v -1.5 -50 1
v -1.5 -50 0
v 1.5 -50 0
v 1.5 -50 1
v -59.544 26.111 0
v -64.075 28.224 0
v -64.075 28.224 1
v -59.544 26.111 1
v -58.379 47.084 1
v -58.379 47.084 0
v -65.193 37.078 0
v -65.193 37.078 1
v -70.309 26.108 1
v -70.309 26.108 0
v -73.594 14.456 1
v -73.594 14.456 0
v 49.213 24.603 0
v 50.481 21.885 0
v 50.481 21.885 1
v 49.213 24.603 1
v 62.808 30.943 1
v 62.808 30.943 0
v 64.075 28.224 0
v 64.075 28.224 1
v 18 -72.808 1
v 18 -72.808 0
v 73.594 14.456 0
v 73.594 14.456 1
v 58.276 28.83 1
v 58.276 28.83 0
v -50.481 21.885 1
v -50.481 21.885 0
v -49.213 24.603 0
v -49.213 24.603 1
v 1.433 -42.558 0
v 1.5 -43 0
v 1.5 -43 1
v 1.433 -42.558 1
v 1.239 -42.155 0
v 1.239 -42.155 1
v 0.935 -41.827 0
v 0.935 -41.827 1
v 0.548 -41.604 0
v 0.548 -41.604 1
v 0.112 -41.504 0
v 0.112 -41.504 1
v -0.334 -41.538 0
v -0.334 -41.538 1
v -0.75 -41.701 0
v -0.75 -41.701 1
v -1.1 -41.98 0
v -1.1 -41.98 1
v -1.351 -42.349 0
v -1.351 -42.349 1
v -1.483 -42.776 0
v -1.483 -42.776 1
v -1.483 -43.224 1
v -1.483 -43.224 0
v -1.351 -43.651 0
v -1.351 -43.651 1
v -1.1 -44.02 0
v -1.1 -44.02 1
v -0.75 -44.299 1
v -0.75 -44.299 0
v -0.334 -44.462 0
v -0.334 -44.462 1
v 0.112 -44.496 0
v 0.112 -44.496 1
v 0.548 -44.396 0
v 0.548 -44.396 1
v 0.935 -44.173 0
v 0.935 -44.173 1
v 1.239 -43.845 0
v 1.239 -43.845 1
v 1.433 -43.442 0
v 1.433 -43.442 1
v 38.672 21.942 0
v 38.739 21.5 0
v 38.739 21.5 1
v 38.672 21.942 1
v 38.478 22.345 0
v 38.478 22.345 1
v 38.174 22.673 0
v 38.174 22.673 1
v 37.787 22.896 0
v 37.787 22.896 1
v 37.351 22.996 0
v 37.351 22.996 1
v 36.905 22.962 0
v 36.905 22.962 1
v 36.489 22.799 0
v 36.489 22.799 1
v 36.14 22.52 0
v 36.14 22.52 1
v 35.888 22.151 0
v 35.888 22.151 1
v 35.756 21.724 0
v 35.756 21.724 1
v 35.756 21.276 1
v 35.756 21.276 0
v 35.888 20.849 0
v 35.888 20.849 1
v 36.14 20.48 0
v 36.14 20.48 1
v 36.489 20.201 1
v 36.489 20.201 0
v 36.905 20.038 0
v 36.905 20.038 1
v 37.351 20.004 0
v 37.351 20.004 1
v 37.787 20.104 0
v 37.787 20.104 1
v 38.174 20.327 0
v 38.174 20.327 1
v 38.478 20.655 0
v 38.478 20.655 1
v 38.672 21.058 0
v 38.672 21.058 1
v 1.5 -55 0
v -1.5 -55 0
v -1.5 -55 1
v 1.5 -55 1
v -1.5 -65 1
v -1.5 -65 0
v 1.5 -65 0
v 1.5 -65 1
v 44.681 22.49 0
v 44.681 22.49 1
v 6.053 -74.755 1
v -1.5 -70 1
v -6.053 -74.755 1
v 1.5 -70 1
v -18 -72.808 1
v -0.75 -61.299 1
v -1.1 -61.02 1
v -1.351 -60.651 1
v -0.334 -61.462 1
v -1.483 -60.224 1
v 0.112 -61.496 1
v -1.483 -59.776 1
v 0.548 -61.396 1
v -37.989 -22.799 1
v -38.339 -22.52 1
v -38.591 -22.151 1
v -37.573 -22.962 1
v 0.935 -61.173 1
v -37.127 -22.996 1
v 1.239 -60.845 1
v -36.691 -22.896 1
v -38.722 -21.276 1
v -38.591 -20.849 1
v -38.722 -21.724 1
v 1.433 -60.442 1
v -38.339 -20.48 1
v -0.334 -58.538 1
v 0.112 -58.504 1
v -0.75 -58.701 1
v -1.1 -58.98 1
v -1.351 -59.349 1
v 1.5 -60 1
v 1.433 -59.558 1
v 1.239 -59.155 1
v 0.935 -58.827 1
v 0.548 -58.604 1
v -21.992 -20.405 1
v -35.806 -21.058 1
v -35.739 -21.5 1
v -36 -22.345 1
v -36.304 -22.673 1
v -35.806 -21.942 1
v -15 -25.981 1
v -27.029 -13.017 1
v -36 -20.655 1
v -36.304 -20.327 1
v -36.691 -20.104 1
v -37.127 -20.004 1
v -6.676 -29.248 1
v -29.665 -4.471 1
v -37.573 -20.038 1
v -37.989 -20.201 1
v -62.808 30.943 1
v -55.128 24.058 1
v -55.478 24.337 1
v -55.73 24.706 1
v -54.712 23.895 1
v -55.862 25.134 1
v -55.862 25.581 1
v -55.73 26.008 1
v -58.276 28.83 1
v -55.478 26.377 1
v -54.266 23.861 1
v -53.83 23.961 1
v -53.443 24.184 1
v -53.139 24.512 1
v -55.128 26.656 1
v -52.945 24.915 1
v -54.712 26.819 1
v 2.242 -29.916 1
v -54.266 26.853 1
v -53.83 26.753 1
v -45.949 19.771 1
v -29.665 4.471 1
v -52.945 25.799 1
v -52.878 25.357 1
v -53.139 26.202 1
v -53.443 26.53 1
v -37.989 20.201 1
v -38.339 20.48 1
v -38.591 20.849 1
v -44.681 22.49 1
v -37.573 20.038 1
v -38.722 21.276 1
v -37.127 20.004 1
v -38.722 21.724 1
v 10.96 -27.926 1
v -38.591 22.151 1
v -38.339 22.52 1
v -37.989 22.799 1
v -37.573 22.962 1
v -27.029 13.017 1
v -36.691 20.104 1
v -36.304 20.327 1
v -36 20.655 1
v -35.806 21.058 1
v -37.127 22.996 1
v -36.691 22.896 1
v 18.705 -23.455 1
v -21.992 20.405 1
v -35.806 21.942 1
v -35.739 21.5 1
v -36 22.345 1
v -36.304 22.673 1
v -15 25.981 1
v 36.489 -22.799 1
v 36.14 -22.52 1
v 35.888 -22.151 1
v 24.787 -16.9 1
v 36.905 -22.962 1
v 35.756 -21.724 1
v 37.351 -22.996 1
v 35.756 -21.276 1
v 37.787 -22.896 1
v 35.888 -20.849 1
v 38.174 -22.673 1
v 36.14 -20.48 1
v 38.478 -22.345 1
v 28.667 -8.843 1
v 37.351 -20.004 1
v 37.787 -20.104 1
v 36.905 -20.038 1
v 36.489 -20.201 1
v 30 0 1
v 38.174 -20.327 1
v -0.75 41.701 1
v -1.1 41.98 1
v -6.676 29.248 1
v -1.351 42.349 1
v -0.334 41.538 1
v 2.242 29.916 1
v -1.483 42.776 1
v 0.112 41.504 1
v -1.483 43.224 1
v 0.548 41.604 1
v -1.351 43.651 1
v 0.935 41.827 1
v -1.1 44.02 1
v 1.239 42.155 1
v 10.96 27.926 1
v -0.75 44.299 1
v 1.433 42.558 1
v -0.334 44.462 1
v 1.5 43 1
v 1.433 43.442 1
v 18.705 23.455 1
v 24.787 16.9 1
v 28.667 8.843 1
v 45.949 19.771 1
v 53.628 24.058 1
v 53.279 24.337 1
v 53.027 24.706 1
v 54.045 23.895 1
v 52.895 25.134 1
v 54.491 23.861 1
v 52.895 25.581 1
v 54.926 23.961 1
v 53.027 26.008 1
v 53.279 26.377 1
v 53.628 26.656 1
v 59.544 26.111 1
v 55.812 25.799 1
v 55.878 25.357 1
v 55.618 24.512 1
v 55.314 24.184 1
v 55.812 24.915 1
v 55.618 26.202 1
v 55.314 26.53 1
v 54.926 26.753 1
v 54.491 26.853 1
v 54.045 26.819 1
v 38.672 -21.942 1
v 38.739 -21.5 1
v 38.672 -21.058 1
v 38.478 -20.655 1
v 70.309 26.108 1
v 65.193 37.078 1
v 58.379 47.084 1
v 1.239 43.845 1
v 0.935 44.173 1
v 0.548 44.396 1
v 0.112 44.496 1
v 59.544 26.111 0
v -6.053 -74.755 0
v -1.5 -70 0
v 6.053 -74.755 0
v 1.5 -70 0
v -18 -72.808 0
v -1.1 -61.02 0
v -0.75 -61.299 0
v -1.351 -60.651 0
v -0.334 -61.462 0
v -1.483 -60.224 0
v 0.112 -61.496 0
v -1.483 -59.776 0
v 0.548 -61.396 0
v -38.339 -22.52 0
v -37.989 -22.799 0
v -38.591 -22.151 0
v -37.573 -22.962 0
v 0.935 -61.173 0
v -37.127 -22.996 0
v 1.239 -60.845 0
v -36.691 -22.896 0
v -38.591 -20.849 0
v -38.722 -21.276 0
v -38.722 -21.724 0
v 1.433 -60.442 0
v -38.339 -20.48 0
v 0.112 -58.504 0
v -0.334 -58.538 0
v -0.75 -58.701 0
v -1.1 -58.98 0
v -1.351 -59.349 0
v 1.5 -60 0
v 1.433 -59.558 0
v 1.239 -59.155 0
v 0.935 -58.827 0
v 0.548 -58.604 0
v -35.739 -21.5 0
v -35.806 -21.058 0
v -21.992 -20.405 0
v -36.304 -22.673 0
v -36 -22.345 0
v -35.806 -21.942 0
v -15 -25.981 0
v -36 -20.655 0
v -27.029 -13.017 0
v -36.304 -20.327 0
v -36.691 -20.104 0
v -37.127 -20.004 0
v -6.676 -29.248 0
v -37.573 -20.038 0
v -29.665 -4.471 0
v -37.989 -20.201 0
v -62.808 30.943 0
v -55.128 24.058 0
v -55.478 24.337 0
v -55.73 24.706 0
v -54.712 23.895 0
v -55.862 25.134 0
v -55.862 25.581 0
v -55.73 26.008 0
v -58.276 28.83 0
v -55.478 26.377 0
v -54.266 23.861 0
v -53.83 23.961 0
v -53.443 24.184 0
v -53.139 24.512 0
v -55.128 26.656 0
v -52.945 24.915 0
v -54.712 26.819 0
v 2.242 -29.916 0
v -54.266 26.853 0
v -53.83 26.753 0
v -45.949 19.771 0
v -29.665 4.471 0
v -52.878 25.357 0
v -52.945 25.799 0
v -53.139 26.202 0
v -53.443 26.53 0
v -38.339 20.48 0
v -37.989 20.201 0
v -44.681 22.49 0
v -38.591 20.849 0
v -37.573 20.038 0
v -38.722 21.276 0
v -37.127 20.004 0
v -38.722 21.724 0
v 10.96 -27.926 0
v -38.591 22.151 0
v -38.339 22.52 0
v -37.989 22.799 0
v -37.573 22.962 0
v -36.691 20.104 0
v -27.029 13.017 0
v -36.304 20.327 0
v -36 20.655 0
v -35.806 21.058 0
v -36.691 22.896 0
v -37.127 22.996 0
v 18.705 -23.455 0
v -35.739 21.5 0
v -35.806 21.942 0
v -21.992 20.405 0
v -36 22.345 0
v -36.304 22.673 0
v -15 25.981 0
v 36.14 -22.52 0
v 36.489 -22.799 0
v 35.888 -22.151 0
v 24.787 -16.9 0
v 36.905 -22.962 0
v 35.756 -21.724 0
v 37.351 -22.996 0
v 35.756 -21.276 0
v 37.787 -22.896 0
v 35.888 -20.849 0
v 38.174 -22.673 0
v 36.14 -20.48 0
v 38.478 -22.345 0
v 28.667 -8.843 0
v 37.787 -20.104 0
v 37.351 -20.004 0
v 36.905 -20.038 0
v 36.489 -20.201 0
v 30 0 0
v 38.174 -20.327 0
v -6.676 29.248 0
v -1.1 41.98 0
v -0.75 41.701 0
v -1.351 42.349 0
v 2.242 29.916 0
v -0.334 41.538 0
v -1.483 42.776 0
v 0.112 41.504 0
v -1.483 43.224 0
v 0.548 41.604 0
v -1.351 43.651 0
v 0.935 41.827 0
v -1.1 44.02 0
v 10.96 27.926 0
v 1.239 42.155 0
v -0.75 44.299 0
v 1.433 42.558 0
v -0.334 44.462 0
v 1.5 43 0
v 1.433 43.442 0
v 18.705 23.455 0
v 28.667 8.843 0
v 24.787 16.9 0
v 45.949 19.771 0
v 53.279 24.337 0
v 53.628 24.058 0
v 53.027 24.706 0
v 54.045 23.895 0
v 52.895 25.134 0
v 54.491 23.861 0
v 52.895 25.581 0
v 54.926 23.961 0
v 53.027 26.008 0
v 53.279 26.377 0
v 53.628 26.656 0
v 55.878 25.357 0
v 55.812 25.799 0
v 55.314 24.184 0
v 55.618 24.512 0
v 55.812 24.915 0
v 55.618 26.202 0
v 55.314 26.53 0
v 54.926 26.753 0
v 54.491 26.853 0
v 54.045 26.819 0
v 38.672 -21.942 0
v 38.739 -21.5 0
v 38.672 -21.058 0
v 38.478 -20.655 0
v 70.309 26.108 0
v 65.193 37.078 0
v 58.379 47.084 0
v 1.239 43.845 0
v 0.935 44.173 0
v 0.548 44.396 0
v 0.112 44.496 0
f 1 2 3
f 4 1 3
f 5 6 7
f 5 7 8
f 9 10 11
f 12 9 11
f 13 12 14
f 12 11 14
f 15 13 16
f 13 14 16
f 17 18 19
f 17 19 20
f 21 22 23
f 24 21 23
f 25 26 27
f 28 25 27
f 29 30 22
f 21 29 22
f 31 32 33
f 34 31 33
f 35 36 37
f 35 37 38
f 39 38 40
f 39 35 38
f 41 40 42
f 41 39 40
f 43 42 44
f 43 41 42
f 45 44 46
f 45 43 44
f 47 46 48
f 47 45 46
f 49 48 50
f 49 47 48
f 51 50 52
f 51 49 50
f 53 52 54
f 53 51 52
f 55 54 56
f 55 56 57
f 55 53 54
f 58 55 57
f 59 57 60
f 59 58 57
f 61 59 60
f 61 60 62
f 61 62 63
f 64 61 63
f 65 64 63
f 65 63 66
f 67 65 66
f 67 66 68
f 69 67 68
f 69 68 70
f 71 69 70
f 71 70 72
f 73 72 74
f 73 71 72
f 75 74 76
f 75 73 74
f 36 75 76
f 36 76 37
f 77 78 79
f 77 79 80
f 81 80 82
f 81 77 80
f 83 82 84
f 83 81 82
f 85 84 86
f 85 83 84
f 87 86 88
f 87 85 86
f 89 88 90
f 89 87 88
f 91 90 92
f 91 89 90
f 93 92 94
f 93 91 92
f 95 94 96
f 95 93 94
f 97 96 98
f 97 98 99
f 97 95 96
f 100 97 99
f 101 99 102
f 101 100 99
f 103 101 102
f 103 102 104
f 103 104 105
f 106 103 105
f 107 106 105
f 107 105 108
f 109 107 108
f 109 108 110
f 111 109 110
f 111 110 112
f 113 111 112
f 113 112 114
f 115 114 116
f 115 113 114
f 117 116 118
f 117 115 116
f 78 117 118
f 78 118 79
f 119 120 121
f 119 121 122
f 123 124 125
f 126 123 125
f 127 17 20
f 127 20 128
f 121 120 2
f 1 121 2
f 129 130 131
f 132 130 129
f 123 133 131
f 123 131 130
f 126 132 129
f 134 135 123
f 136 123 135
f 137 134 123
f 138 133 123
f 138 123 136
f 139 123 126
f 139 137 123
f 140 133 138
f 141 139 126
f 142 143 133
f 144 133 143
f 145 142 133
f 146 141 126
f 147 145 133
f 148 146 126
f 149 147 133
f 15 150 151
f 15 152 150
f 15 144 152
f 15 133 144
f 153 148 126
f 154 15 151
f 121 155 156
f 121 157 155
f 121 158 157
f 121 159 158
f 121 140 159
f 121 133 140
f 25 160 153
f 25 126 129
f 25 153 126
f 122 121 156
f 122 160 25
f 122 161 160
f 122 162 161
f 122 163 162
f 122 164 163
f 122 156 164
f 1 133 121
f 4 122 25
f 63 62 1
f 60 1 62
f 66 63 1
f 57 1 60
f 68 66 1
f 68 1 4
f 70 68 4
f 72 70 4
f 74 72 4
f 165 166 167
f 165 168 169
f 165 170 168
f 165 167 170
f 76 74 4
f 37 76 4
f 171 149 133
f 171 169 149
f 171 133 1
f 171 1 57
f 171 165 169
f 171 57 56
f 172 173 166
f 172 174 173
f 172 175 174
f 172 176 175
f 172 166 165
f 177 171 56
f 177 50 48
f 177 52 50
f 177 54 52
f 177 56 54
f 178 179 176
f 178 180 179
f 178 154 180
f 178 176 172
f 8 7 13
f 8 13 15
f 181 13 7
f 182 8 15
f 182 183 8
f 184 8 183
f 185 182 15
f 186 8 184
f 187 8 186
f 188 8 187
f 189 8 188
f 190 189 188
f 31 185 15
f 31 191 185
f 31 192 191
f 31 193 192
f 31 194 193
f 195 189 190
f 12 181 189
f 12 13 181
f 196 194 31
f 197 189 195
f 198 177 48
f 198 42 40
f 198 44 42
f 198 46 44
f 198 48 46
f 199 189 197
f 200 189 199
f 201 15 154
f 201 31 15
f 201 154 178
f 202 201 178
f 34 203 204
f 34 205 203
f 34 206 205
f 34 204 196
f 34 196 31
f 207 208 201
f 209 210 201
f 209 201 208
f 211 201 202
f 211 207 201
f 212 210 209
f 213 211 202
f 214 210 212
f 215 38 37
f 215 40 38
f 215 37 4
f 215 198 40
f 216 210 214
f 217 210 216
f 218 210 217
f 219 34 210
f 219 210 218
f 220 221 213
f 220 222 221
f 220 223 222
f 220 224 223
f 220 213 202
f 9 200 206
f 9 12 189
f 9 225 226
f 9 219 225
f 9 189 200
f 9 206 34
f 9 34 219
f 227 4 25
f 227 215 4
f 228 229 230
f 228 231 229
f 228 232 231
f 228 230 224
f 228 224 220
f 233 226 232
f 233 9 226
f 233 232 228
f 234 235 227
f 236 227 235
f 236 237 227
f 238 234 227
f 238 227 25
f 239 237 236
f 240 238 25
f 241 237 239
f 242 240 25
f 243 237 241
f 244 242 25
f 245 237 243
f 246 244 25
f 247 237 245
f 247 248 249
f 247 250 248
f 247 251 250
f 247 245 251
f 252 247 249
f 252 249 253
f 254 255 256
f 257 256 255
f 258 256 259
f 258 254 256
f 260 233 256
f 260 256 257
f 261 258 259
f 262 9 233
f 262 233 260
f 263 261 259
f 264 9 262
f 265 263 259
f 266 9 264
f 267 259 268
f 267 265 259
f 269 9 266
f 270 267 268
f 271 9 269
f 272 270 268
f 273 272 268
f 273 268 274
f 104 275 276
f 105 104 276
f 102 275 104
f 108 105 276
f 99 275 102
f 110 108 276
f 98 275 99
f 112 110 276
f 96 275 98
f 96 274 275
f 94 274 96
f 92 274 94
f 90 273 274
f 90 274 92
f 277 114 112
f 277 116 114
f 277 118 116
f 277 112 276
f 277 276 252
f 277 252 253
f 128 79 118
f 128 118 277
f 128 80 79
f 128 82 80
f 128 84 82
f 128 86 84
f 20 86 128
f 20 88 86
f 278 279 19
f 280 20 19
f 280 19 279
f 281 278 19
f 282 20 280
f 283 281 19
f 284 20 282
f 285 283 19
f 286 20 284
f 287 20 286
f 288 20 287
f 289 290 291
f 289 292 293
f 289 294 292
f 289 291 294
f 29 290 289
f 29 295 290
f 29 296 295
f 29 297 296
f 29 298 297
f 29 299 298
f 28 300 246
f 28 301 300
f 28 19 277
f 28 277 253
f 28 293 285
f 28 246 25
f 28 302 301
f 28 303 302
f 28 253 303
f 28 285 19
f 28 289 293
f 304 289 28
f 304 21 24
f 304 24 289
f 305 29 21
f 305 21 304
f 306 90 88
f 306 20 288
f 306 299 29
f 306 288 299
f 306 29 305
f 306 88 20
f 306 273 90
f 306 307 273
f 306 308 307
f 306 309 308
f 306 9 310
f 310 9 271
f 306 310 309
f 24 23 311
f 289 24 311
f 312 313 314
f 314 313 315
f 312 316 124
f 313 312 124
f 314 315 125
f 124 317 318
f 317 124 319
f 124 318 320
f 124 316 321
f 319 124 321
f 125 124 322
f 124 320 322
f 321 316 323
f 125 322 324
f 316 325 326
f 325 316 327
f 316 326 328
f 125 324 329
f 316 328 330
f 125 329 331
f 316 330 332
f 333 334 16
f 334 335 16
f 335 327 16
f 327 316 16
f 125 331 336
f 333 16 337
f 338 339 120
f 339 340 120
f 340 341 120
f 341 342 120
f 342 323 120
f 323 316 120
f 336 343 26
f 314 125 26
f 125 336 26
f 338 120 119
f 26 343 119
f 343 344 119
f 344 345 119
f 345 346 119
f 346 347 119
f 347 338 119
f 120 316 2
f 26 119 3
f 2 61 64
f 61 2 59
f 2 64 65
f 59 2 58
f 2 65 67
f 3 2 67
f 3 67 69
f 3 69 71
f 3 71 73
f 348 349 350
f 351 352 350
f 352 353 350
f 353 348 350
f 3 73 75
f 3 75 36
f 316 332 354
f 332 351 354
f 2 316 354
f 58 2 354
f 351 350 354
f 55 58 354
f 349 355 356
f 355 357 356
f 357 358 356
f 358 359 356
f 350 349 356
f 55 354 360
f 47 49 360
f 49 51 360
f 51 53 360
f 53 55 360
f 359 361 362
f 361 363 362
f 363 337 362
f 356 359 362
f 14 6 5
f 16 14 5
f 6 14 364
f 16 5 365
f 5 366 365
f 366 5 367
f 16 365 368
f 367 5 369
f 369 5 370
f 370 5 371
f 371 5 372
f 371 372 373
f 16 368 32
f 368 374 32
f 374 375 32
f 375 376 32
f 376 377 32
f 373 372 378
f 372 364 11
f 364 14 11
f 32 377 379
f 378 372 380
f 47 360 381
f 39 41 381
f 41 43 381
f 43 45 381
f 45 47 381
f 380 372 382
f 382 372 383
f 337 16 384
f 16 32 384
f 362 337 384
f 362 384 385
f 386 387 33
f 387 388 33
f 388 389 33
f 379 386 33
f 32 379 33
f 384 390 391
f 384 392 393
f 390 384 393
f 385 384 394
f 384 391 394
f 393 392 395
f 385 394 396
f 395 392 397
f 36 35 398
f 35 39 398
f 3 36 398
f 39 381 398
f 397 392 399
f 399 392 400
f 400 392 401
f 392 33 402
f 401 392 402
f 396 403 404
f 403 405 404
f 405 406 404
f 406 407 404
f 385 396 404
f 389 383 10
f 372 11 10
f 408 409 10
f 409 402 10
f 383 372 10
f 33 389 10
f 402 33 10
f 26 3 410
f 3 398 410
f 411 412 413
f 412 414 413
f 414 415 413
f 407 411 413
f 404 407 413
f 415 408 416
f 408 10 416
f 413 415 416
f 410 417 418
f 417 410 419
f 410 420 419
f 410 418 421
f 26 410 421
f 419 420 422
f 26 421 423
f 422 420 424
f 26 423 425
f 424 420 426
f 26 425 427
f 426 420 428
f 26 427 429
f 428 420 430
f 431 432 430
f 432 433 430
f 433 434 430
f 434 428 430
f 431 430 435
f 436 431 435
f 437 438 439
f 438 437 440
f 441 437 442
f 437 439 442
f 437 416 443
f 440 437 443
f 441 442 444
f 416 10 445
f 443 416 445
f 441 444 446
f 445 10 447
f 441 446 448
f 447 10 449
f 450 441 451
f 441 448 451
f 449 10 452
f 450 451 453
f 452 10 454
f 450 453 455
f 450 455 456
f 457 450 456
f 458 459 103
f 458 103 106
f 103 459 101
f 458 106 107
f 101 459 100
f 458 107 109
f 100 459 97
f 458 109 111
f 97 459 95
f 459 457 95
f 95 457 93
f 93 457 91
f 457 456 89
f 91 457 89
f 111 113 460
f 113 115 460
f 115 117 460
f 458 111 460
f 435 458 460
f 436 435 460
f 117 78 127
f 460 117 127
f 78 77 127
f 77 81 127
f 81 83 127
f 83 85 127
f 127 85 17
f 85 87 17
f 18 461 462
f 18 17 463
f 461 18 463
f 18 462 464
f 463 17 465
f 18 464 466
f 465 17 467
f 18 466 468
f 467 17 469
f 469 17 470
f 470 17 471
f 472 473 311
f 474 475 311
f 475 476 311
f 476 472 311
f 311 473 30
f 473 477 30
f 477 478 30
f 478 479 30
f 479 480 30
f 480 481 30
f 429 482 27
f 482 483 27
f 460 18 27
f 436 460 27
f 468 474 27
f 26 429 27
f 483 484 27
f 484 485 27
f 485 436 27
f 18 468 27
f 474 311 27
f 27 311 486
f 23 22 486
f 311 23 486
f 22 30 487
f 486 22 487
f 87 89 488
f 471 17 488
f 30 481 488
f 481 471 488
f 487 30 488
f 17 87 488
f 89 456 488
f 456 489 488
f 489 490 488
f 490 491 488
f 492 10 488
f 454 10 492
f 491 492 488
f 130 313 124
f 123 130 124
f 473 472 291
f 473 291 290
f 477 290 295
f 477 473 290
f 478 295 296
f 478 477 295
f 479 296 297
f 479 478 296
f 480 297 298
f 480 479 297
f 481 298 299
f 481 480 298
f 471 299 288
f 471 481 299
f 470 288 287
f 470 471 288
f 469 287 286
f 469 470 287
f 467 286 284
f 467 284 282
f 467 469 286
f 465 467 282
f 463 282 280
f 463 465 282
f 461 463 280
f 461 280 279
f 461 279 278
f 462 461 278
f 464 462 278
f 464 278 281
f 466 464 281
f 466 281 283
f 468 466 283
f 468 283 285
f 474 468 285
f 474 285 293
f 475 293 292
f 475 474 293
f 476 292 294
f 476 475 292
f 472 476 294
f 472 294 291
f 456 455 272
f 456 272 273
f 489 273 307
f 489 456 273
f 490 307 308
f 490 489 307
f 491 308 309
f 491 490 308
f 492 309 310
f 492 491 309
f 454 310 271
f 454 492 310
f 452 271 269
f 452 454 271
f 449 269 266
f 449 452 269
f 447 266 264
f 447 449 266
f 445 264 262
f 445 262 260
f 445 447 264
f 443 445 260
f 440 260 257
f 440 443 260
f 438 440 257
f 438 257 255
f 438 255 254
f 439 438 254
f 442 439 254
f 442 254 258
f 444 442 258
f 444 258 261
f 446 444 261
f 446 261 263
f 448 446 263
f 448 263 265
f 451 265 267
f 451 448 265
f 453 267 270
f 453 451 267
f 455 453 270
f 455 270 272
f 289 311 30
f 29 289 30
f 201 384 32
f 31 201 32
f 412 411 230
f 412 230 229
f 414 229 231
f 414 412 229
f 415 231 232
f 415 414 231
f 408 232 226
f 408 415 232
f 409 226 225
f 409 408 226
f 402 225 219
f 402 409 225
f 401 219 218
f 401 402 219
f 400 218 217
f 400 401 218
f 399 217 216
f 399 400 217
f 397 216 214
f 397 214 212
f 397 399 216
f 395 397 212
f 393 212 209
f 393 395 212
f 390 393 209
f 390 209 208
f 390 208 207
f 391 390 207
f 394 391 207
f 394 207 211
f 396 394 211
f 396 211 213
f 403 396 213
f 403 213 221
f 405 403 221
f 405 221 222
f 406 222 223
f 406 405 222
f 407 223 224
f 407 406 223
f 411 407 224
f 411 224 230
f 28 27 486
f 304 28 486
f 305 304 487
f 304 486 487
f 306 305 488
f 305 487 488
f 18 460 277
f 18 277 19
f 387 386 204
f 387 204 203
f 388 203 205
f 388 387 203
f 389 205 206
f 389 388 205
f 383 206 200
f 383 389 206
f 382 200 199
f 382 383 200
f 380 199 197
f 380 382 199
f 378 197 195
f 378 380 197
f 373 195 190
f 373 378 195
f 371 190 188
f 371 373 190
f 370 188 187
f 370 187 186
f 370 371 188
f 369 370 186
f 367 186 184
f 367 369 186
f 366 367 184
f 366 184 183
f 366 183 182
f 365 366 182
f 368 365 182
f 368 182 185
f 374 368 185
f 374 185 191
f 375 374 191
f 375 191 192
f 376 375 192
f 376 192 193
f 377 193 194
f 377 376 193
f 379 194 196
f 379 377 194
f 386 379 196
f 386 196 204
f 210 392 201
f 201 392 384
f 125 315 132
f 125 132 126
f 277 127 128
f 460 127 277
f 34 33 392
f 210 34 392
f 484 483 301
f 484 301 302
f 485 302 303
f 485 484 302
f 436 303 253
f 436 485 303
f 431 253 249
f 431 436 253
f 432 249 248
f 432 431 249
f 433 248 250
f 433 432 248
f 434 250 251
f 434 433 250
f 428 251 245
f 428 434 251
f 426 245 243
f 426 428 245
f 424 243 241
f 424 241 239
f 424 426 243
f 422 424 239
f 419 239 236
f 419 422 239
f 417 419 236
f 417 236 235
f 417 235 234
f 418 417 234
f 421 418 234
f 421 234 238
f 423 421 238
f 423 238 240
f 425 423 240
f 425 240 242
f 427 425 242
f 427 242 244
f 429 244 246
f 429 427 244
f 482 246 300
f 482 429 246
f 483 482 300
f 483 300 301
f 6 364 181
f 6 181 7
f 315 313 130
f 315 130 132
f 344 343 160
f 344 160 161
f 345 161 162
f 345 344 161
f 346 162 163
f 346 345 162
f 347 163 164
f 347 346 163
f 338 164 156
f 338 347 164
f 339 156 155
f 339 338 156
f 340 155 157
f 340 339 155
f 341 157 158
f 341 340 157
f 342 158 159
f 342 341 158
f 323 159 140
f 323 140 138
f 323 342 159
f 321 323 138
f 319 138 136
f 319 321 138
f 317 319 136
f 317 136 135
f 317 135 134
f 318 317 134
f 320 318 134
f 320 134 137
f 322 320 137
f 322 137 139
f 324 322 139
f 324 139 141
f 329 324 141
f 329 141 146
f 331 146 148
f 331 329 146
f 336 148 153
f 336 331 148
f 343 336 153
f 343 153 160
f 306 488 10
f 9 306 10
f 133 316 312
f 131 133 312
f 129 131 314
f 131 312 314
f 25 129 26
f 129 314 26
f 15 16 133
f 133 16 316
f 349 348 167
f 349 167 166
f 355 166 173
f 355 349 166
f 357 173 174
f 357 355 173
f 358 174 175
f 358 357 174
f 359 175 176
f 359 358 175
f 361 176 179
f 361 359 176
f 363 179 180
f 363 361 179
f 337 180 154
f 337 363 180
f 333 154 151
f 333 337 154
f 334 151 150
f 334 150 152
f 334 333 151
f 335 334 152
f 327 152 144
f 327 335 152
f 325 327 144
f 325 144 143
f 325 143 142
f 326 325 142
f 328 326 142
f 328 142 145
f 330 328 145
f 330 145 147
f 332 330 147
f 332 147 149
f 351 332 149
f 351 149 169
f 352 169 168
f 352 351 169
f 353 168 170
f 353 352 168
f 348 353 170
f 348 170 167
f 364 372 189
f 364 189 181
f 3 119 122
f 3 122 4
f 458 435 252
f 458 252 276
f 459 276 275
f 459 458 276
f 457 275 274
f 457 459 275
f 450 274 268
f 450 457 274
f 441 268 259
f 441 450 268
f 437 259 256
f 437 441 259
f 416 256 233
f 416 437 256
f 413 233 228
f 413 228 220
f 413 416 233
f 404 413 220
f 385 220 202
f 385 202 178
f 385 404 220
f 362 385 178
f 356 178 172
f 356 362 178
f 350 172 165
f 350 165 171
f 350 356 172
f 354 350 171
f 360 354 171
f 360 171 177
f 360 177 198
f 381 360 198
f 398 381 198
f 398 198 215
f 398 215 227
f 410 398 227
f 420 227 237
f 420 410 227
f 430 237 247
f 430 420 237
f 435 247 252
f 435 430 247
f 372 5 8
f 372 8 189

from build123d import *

# Parameters (mm, degrees)
SKETCH1_R           = 30
SKETCH1_R_2         = 1.5
SKETCH1_W           = 3
SKETCH1_H           = 5
BOSS_EXTRUDE1_DEPTH = 1


with BuildPart() as part:
    # Sketch1 → Boss-Extrude1 (new body)
    with BuildSketch(Plane.XY):
        with BuildLine():
            Line((-73.593555797, 14.456436117), (-18, -72.807966597))
            ThreePointArc((-18, -72.807966597), (0, -75), (18, -72.807966597))
            Line((18, -72.807966597), (73.593555797, 14.456436117))
            ThreePointArc((73.593555797, 14.456436117), (67.973084028, 31.696369631), (58.379298374, 47.083516451))
            Line((58.379298374, 47.083516451), (-58.379298374, 47.083516451))
            ThreePointArc((-58.379298374, 47.083516451), (-67.973084028, 31.696369631), (-73.593555797, 14.456436117))
        make_face()
        Circle(SKETCH1_R, mode=Mode.SUBTRACT)
        with Locations((0, -43)):
            Circle(SKETCH1_R_2, mode=Mode.SUBTRACT)
        with Locations((-37.239092363, -21.5)):
            Circle(SKETCH1_R_2, mode=Mode.SUBTRACT)
        with Locations((-37.239092363, 21.5)):
            Circle(SKETCH1_R_2, mode=Mode.SUBTRACT)
        with Locations((0, 43)):
            Circle(SKETCH1_R_2, mode=Mode.SUBTRACT)
        with Locations((37.239092363, 21.5)):
            Circle(SKETCH1_R_2, mode=Mode.SUBTRACT)
        with Locations((37.239092363, -21.5)):
            Circle(SKETCH1_R_2, mode=Mode.SUBTRACT)
        with Locations((0, -60)):
            Circle(SKETCH1_R_2, mode=Mode.SUBTRACT)
        with Locations((54.378467222, 25.357095704)):
            Circle(SKETCH1_R_2, mode=Mode.SUBTRACT)
        with Locations((-54.378467222, 25.357095704)):
            Circle(SKETCH1_R_2, mode=Mode.SUBTRACT)
        with Locations((0, -52.5)):
            Rectangle(SKETCH1_W, SKETCH1_H, mode=Mode.SUBTRACT)
        with Locations((0, -67.5)):
            Rectangle(SKETCH1_W, SKETCH1_H, mode=Mode.SUBTRACT)
        Polygon((49.213000894, 24.603466076), (44.681461959, 22.490374768), (45.949316744, 19.771451406), (50.48085568, 21.884542715), align=None, mode=Mode.SUBTRACT)
        Polygon((58.276078765, 28.829648694), (62.8076177, 30.942740002), (64.075472485, 28.223816641), (59.54393355, 26.110725333), align=None, mode=Mode.SUBTRACT)
        Polygon((-58.276078765, 28.829648694), (-62.8076177, 30.942740002), (-64.075472485, 28.223816641), (-59.54393355, 26.110725333), align=None, mode=Mode.SUBTRACT)
        Polygon((-49.213000894, 24.603466076), (-44.681461959, 22.490374768), (-45.949316744, 19.771451406), (-50.48085568, 21.884542715), align=None, mode=Mode.SUBTRACT)
    extrude(amount=BOSS_EXTRUDE1_DEPTH)


solid = part.part
